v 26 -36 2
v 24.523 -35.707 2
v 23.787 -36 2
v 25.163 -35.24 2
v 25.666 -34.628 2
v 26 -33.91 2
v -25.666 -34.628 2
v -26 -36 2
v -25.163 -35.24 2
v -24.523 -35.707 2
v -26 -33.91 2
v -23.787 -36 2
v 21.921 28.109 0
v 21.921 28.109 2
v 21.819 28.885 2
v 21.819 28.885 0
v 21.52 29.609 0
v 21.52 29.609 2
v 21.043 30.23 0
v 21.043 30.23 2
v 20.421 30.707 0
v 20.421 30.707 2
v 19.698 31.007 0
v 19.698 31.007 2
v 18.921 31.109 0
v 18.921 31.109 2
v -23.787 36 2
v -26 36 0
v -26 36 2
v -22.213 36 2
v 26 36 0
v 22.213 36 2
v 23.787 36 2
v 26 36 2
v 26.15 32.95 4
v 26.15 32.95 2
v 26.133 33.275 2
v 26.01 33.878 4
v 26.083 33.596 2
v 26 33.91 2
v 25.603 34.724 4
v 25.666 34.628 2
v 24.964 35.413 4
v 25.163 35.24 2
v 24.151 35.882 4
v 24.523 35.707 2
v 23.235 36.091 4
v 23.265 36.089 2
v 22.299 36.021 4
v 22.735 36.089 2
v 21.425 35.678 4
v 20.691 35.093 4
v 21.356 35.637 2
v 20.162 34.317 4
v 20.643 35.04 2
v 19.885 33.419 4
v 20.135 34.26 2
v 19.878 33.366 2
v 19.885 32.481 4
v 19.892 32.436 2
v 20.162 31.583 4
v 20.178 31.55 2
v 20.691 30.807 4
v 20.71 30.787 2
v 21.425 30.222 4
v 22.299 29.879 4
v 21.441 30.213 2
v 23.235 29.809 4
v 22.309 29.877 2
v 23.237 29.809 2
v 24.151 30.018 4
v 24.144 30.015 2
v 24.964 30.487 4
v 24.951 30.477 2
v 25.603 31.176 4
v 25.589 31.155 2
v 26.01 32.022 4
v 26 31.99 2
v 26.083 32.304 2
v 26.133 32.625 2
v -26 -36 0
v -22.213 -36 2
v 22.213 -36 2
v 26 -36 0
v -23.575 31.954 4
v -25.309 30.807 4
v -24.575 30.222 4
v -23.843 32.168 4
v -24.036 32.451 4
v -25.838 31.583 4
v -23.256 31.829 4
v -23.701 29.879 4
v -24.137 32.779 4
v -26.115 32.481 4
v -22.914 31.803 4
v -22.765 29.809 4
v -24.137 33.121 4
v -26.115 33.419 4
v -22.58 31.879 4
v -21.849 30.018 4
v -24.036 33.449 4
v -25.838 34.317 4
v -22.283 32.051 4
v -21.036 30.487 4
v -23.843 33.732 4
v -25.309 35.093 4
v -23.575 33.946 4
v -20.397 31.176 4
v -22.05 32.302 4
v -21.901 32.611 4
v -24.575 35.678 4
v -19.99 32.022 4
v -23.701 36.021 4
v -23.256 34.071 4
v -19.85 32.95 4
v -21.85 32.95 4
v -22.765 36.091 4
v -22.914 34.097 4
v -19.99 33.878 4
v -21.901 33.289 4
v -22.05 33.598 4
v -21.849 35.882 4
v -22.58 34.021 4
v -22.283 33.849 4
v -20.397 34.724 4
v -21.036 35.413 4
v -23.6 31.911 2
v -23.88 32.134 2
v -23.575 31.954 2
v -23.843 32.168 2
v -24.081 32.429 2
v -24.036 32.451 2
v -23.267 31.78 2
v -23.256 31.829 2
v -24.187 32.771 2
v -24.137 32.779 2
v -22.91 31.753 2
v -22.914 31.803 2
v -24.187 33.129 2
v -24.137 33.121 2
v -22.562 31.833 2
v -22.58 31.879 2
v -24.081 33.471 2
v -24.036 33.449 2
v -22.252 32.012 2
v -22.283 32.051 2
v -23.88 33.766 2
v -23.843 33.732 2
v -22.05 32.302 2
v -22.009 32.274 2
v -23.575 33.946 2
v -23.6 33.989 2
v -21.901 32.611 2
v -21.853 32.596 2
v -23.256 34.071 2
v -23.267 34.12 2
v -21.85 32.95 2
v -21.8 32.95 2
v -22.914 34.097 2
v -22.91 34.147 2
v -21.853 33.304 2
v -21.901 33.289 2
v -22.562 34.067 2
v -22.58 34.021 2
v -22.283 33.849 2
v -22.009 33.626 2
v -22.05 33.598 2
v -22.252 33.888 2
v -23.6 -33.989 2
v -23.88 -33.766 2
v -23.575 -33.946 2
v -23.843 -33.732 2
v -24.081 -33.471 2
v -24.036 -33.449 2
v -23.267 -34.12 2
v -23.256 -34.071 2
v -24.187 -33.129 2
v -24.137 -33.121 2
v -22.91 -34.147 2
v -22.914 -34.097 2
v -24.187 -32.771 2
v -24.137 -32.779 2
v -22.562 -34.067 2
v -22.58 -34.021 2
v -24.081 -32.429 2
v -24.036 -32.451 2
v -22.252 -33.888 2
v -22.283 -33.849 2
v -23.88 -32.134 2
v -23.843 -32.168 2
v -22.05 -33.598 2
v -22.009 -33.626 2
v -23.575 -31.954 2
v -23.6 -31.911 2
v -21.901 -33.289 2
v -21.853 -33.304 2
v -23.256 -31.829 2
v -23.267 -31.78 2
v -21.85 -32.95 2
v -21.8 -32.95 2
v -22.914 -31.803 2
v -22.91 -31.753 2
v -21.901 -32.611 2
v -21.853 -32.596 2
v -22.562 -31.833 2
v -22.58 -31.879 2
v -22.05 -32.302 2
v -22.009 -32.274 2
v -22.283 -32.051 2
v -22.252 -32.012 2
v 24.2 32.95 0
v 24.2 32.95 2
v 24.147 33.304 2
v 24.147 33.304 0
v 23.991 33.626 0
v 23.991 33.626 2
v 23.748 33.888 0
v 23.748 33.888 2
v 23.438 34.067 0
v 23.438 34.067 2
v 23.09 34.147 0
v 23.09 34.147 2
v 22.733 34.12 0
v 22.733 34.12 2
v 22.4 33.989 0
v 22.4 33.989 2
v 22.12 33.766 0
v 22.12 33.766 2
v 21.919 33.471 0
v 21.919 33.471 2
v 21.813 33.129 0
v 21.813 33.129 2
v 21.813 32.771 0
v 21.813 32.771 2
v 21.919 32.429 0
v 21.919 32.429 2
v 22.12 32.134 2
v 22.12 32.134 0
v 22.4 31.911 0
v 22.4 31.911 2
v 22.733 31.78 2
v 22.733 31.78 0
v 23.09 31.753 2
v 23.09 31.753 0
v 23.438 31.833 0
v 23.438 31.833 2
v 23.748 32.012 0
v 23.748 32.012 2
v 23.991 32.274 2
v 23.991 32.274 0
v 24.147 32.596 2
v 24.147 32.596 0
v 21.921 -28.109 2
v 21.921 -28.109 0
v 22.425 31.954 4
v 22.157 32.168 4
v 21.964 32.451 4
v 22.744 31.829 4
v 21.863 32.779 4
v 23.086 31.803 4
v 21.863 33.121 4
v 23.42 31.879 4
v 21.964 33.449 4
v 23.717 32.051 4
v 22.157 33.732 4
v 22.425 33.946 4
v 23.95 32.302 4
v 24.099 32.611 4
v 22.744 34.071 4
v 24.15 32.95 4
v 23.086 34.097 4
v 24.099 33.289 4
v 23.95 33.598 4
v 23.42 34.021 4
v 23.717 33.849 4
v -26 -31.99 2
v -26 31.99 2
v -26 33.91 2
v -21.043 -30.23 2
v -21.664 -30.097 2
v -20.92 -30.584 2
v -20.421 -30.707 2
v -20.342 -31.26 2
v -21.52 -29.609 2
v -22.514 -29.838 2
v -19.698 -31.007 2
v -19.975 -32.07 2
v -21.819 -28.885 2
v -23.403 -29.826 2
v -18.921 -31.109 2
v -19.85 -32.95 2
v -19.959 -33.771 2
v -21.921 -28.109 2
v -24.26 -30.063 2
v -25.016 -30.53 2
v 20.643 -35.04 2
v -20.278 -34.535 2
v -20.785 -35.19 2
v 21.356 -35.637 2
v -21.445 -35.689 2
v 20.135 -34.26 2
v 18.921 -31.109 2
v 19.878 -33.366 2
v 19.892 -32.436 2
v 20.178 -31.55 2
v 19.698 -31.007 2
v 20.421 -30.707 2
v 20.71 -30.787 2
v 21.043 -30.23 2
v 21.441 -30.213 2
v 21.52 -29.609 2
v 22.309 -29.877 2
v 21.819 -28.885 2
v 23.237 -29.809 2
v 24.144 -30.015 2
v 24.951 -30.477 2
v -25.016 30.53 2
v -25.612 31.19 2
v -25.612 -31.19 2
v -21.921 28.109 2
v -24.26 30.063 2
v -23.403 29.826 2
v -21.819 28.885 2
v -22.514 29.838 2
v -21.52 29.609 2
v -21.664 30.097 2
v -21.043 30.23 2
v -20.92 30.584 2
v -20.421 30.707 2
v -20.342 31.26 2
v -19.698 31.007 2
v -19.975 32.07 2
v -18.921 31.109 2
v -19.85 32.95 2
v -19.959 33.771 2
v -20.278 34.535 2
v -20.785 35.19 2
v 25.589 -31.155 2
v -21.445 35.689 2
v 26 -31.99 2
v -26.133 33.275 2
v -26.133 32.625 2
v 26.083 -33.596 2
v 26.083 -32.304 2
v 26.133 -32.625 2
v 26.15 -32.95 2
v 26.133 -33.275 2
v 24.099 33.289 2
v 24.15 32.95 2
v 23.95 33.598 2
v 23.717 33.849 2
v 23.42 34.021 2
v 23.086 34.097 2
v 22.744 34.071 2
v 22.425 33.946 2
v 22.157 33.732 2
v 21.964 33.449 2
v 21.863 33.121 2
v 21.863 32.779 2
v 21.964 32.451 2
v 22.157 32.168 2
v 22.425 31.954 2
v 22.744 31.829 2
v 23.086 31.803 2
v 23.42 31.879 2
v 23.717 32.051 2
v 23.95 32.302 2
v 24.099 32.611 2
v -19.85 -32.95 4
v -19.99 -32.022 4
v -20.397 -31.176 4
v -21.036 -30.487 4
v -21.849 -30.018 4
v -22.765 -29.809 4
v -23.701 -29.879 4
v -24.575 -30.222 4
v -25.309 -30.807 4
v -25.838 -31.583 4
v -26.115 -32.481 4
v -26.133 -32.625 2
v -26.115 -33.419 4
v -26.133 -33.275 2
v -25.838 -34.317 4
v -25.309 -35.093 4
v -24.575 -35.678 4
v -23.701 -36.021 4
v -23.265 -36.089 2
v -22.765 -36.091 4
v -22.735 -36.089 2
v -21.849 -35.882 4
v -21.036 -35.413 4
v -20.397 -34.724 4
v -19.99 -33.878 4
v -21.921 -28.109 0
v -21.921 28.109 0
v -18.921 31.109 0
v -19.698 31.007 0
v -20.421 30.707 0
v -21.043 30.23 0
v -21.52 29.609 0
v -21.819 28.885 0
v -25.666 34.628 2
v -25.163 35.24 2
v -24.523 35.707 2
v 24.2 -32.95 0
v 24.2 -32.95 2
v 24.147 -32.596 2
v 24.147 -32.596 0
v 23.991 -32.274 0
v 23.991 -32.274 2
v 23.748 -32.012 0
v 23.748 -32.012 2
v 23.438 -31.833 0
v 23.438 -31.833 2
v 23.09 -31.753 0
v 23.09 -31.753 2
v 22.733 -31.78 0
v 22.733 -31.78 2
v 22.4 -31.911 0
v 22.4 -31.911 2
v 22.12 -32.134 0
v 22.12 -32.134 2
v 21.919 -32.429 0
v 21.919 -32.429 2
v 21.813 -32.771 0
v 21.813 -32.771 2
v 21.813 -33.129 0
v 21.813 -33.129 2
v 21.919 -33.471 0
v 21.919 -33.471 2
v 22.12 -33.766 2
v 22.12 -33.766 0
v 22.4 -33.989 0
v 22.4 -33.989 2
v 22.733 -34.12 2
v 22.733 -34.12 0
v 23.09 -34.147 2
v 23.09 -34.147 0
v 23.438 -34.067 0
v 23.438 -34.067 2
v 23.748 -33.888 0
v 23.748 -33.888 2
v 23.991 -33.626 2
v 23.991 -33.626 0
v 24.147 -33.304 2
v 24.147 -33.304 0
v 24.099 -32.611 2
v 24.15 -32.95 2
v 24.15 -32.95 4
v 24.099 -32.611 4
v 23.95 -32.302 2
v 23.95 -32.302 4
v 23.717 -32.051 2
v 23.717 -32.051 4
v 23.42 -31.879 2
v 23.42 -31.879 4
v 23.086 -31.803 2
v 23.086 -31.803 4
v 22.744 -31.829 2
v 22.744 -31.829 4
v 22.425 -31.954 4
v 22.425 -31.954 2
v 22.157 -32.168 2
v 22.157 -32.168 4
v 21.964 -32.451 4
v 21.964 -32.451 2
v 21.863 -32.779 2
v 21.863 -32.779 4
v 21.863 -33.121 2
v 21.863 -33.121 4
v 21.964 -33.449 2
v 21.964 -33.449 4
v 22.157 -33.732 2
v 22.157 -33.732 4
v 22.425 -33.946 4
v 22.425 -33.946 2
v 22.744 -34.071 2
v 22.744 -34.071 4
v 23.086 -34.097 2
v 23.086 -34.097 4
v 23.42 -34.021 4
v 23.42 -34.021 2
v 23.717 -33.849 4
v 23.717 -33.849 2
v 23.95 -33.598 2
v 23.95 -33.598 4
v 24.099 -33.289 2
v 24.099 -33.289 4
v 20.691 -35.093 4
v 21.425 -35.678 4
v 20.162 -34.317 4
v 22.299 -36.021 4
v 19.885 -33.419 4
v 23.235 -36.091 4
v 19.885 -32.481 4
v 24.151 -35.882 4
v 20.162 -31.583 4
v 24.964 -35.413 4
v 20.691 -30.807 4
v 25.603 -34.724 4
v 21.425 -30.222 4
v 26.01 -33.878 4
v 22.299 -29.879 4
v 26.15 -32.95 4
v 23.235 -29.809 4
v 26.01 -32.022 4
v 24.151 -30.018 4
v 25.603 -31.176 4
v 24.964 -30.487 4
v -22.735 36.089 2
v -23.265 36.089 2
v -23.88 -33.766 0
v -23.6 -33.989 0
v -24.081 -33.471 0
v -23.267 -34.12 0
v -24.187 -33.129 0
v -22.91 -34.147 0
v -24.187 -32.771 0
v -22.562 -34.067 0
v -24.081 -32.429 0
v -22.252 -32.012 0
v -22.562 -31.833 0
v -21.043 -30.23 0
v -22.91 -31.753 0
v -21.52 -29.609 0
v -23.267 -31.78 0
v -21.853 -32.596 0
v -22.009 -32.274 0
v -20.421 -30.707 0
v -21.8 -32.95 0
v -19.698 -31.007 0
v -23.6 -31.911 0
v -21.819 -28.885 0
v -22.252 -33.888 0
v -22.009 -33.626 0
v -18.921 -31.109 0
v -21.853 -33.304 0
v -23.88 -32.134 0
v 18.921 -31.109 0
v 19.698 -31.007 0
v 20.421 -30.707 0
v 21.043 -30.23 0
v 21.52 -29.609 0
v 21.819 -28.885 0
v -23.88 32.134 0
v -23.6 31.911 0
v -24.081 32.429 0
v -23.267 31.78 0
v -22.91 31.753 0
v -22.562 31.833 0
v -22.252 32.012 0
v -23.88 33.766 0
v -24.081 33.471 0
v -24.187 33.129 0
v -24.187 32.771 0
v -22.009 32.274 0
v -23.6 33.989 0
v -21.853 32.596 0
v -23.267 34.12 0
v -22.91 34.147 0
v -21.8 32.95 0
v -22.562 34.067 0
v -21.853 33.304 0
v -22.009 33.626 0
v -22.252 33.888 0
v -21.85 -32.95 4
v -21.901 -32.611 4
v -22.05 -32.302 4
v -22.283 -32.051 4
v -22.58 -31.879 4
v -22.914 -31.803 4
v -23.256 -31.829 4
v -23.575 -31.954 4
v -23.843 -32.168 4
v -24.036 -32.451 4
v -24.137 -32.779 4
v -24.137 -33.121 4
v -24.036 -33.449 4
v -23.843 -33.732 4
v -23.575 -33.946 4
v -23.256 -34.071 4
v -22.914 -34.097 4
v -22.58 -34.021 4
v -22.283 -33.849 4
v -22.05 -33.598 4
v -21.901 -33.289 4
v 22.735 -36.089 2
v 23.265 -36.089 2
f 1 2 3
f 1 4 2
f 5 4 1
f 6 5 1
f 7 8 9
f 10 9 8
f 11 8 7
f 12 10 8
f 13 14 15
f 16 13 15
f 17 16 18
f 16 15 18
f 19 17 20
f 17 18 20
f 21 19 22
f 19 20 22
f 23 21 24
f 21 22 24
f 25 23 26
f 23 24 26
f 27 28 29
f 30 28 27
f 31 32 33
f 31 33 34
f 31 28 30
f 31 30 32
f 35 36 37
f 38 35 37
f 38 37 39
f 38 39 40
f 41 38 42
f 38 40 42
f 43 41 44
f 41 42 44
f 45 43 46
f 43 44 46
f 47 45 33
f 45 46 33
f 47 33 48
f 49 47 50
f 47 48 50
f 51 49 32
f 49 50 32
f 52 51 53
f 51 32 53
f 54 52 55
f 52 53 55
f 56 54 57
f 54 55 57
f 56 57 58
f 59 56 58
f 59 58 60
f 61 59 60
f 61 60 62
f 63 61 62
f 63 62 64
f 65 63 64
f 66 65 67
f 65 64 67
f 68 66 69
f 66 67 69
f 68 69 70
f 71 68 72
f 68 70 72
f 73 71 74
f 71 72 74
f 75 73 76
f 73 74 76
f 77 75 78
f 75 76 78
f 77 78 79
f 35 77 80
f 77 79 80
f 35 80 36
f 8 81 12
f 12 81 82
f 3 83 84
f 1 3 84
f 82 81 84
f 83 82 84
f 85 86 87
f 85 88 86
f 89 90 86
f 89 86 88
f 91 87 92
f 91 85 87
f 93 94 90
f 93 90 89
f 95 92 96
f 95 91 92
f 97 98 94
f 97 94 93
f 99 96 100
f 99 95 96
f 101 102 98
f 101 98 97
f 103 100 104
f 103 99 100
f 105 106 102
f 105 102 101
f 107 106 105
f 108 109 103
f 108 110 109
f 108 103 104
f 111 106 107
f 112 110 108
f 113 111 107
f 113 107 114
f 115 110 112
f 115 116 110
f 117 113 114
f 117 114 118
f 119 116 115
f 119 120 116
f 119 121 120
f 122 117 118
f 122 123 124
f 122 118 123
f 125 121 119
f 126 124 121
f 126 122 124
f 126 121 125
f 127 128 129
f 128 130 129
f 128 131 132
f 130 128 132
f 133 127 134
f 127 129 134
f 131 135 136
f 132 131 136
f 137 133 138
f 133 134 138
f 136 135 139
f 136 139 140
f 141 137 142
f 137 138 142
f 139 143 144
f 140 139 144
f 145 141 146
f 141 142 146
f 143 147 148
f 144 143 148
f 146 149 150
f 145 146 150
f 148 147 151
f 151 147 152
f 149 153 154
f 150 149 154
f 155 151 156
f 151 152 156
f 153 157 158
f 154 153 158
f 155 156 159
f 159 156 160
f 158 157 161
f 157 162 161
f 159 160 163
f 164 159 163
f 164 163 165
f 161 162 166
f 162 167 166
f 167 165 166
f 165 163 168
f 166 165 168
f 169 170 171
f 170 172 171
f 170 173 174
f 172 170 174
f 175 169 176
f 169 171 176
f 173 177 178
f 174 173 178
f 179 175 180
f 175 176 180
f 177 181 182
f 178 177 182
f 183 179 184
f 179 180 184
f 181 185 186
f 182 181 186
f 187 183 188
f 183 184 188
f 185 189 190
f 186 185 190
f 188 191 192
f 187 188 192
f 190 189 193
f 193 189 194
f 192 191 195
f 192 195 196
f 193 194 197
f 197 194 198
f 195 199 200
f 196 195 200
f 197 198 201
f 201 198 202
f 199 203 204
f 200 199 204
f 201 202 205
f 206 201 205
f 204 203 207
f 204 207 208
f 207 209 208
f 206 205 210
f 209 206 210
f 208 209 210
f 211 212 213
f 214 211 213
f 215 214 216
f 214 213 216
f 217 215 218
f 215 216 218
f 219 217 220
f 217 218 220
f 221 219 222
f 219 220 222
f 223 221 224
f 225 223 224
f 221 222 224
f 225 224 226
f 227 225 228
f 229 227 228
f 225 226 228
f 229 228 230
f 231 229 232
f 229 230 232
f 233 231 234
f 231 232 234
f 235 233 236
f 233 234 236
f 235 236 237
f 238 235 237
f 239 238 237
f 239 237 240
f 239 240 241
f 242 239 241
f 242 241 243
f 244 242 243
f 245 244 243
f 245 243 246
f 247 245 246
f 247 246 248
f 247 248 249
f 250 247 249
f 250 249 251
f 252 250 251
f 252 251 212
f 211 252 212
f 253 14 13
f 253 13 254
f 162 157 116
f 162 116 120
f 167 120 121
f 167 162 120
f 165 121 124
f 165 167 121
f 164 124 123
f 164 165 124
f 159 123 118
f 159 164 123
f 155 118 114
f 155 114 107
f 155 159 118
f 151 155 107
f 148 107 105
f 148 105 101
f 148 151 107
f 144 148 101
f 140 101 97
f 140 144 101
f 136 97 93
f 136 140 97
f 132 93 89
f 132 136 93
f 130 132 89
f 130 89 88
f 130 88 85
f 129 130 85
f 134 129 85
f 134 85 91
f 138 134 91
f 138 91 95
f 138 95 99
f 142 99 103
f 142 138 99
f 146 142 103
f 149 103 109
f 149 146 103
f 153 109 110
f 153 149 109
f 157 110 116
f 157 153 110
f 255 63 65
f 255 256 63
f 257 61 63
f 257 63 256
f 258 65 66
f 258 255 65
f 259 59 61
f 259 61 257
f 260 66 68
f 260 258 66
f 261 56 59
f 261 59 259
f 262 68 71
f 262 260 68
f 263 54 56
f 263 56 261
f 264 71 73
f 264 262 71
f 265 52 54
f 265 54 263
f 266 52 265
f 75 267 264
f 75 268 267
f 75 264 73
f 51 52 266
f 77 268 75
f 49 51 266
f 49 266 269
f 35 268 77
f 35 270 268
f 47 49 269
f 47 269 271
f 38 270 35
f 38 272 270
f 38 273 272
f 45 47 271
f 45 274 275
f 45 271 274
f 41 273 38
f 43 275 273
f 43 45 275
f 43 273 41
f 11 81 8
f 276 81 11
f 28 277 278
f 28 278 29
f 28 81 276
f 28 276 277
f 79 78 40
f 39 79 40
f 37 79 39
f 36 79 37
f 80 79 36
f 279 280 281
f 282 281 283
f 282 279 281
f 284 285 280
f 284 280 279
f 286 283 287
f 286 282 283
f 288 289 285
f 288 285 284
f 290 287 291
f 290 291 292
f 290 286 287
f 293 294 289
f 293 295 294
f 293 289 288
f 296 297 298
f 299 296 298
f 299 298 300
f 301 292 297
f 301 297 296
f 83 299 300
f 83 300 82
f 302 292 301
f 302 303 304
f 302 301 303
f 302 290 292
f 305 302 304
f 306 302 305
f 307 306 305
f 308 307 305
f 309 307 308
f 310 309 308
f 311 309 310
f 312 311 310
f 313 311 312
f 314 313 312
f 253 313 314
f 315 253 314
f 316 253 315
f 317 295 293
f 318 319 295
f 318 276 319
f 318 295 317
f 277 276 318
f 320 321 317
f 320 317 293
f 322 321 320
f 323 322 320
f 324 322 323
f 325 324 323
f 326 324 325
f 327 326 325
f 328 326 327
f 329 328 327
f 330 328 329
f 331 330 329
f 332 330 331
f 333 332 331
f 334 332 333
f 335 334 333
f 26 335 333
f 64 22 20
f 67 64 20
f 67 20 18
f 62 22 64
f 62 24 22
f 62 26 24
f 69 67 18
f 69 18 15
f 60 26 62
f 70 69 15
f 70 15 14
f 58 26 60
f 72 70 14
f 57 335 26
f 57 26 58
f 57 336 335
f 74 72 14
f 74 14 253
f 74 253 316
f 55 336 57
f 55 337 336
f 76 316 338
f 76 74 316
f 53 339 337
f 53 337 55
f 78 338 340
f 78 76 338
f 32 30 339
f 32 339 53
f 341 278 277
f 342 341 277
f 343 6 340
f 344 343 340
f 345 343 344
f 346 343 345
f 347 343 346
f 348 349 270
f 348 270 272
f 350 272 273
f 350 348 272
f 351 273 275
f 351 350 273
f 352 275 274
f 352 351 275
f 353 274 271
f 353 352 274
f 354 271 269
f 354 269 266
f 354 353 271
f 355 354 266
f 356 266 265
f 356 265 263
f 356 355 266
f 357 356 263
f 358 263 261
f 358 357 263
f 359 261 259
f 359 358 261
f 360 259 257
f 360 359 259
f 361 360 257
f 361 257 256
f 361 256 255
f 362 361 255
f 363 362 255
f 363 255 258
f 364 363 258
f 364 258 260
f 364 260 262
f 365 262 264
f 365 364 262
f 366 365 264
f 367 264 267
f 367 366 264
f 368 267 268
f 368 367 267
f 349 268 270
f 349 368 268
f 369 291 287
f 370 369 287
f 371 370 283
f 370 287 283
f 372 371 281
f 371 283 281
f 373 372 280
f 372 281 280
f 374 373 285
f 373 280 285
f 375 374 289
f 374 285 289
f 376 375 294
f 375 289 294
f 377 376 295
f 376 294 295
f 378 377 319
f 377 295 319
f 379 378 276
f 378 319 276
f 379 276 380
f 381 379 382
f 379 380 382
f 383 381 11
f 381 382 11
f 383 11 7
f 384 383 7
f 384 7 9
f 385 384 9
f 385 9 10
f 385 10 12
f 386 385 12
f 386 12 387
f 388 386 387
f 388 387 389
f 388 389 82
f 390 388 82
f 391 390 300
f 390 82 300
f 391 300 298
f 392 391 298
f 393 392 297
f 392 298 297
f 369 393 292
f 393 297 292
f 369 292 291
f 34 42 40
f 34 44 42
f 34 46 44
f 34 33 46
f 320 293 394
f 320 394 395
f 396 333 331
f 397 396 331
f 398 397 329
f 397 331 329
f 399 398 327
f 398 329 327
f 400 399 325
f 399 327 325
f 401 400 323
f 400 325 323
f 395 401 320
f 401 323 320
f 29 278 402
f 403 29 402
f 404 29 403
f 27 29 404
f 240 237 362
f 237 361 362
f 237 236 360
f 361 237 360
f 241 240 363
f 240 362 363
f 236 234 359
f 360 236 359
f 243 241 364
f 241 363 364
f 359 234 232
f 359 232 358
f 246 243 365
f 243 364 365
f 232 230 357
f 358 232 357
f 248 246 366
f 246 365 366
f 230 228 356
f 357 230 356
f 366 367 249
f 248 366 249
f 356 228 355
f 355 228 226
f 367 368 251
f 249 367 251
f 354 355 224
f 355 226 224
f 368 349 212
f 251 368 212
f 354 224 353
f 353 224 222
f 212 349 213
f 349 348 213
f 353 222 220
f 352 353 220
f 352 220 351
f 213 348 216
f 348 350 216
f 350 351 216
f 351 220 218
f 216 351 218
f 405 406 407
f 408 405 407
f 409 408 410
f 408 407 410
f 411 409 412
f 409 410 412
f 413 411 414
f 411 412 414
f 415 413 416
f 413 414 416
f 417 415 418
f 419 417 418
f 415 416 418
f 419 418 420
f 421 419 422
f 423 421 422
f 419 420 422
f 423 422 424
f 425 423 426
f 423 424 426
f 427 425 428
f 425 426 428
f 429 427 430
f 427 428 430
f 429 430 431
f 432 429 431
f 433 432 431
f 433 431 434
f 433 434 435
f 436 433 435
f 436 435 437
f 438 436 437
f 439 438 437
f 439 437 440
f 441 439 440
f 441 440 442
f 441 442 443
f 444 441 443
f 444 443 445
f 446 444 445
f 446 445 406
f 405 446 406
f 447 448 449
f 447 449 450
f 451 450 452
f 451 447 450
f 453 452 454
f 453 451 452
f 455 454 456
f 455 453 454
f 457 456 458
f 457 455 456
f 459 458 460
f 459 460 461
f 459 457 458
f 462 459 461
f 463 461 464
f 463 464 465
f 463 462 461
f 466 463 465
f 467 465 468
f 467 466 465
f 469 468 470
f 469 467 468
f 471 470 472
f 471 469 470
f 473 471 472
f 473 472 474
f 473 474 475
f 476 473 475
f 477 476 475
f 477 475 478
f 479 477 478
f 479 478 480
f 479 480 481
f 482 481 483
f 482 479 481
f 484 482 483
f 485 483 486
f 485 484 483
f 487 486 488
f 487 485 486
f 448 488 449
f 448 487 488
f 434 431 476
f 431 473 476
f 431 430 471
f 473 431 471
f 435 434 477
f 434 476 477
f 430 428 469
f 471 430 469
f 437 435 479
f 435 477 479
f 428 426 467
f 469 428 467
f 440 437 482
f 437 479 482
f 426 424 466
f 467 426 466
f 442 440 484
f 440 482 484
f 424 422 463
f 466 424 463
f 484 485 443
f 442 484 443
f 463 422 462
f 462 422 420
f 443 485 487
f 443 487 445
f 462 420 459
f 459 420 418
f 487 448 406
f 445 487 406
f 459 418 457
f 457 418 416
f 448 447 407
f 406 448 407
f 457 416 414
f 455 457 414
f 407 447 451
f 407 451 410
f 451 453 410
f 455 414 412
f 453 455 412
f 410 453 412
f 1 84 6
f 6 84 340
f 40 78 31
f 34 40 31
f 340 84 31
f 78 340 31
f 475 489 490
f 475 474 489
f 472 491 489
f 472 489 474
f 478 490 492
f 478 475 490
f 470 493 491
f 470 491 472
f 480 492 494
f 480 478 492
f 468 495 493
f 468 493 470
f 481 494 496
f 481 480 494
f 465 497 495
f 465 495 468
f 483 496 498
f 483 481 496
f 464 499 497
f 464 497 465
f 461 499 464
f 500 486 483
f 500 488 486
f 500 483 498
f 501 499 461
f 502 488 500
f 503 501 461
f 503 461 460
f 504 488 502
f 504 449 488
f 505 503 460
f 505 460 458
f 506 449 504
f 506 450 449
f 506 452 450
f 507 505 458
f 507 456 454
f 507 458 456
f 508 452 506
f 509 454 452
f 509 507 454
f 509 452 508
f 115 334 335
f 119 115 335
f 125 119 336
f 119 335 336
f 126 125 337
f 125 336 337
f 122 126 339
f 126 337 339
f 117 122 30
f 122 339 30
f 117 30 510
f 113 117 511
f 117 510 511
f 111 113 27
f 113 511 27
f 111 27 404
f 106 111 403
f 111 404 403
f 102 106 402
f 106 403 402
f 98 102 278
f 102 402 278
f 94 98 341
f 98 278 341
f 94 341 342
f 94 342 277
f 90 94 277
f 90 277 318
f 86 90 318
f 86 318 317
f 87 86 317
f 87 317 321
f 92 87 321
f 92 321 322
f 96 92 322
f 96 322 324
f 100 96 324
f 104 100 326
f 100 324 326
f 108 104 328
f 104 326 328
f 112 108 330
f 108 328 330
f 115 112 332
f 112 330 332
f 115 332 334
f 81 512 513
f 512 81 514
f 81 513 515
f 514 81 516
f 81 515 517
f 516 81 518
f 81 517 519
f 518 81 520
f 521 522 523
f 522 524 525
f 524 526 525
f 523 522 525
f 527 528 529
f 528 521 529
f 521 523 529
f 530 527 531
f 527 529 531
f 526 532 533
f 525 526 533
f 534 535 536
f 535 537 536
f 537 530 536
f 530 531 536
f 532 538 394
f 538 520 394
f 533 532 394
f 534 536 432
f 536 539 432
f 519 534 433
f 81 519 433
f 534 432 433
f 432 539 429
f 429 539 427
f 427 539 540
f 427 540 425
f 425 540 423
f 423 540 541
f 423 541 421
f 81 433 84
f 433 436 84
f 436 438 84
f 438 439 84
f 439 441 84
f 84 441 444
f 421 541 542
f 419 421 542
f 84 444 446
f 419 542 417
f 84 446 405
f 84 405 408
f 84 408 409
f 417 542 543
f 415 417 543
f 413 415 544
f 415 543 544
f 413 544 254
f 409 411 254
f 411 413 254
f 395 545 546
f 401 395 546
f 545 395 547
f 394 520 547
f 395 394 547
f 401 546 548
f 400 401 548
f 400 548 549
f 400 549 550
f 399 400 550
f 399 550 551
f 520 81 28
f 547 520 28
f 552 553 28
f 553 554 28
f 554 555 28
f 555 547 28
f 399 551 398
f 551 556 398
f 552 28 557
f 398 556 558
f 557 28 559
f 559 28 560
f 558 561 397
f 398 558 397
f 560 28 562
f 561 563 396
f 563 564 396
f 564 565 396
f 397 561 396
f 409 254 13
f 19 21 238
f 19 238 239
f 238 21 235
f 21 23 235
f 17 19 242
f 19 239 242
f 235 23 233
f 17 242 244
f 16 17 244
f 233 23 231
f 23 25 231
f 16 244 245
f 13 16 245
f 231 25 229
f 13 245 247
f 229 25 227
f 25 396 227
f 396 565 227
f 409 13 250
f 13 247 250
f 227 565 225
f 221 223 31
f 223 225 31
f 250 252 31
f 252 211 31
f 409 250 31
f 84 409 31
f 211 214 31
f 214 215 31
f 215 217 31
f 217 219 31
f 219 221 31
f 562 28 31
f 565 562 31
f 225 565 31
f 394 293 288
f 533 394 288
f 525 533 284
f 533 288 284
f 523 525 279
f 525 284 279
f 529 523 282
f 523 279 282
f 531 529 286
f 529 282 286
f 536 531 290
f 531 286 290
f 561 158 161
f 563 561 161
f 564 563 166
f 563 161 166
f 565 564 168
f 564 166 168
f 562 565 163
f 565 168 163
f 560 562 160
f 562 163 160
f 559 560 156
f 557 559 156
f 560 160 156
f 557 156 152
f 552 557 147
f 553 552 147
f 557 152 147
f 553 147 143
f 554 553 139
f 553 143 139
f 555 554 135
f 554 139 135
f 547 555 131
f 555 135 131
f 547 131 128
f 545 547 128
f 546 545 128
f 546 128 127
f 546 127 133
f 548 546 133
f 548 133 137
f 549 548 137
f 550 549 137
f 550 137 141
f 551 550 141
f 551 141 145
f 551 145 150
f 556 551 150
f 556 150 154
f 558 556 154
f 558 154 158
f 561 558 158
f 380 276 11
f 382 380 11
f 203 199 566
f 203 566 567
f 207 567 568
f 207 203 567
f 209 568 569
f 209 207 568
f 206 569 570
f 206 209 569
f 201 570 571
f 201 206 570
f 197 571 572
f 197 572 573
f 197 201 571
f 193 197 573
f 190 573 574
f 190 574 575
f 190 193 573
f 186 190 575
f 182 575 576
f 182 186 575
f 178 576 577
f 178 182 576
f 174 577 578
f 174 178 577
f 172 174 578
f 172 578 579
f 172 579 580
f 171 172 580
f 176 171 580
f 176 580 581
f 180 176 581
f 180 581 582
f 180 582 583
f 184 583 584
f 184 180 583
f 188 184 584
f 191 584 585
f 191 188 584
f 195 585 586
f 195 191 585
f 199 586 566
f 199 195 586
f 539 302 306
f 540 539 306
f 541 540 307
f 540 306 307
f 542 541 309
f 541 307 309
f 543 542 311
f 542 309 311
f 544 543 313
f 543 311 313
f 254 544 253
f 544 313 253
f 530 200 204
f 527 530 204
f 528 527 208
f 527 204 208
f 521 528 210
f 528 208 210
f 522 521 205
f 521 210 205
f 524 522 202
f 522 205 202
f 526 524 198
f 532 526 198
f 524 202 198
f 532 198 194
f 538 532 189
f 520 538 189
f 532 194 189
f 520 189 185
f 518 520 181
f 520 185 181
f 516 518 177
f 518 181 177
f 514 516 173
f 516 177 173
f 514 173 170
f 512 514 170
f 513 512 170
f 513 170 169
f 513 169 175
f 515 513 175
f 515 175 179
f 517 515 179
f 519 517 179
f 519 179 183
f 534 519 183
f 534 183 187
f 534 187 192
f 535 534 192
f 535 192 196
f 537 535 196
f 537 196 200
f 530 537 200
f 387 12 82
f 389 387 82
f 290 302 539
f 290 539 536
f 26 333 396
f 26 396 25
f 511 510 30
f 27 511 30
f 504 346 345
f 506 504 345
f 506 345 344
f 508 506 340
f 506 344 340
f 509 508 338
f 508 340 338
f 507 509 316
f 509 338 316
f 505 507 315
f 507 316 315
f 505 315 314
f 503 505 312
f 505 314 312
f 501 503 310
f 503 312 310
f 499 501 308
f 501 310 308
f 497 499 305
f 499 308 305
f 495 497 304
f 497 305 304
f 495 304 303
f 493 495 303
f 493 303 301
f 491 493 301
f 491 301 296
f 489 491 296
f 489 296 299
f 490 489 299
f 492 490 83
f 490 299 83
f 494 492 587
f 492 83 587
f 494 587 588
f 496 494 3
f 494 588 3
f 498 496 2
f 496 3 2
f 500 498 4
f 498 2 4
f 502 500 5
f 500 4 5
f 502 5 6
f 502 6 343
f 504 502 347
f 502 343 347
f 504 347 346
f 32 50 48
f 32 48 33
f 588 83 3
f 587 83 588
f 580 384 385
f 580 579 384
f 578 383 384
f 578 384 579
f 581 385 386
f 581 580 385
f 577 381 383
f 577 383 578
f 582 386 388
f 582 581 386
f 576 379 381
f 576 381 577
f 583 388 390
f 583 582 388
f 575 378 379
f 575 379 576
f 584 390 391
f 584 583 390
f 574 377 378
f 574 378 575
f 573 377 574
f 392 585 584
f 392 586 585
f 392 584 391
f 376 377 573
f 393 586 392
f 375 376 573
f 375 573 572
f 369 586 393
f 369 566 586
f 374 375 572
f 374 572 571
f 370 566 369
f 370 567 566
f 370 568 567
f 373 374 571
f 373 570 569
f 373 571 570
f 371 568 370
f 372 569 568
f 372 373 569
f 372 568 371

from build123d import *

# Parameters (mm, degrees)
SKETCH_W        = 52
SKETCH_H        = 72
PAD_DEPTH       = 2
SKETCH001_R     = 1.2
POCKET_DEPTH    = 5
SKETCH002_R     = 3.15
SKETCH002_R_2   = 1.15
PAD001_DEPTH    = 2
POCKET001_DEPTH = 5


with BuildPart() as part:
    # Sketch → Pad (new body)
    with BuildSketch(Plane.XY):
        Rectangle(SKETCH_W, SKETCH_H)
    extrude(amount=PAD_DEPTH)

    # Sketch001 (on Face6 of Pad) → Pocket (cut)
    with BuildSketch(Plane.XY.offset(2)):
        with Locations((-23, 32.95)):
            Circle(SKETCH001_R)
        with Locations((23, 32.95)):
            Circle(SKETCH001_R)
        with Locations((-23, -32.95)):
            Circle(SKETCH001_R)
        with Locations((23, -32.95)):
            Circle(SKETCH001_R)
    extrude(amount=-POCKET_DEPTH, mode=Mode.SUBTRACT)

    # Sketch002 (on Face5 of Pocket) → Pad001 (join)
    with BuildSketch(Plane.XY.offset(2)):
        with Locations((-23, 32.95)):
            Circle(SKETCH002_R)
        with Locations((-23, 32.95)):
            Circle(SKETCH002_R_2, mode=Mode.SUBTRACT)
        with Locations((23, 32.95)):
            Circle(SKETCH002_R)
        with Locations((23, 32.95)):
            Circle(SKETCH002_R_2, mode=Mode.SUBTRACT)
        with Locations((-23, -32.95)):
            Circle(SKETCH002_R)
        with Locations((-23, -32.95)):
            Circle(SKETCH002_R_2, mode=Mode.SUBTRACT)
        with Locations((23, -32.95)):
            Circle(SKETCH002_R)
        with Locations((23, -32.95)):
            Circle(SKETCH002_R_2, mode=Mode.SUBTRACT)
    extrude(amount=PAD001_DEPTH)

    # Sketch003 (on Face5 of Pad001) → Pocket001 (cut)
    with BuildSketch(Plane.XY.offset(2)):
        with BuildLine():
            Line((-18.921431, 31.109041), (18.921431, 31.109041))
            ThreePointArc((21.921431, 28.109041), (21.042751, 30.230361), (18.921431, 31.109041))
            Line((21.921431, 28.109041), (21.921431, -28.109041))
            ThreePointArc((18.921431, -31.109041), (21.042751, -30.230361), (21.921431, -28.109041))
            Line((18.921431, -31.109041), (-18.921431, -31.109041))
            ThreePointArc((-21.921431, -28.109041), (-21.042751, -30.230361), (-18.921431, -31.109041))
            Line((-21.921431, -28.109041), (-21.921431, 28.109041))
            ThreePointArc((-18.921431, 31.109041), (-21.042751, 30.230361), (-21.921431, 28.109041))
        make_face()
    extrude(amount=-POCKET001_DEPTH, mode=Mode.SUBTRACT)


solid = part.part
